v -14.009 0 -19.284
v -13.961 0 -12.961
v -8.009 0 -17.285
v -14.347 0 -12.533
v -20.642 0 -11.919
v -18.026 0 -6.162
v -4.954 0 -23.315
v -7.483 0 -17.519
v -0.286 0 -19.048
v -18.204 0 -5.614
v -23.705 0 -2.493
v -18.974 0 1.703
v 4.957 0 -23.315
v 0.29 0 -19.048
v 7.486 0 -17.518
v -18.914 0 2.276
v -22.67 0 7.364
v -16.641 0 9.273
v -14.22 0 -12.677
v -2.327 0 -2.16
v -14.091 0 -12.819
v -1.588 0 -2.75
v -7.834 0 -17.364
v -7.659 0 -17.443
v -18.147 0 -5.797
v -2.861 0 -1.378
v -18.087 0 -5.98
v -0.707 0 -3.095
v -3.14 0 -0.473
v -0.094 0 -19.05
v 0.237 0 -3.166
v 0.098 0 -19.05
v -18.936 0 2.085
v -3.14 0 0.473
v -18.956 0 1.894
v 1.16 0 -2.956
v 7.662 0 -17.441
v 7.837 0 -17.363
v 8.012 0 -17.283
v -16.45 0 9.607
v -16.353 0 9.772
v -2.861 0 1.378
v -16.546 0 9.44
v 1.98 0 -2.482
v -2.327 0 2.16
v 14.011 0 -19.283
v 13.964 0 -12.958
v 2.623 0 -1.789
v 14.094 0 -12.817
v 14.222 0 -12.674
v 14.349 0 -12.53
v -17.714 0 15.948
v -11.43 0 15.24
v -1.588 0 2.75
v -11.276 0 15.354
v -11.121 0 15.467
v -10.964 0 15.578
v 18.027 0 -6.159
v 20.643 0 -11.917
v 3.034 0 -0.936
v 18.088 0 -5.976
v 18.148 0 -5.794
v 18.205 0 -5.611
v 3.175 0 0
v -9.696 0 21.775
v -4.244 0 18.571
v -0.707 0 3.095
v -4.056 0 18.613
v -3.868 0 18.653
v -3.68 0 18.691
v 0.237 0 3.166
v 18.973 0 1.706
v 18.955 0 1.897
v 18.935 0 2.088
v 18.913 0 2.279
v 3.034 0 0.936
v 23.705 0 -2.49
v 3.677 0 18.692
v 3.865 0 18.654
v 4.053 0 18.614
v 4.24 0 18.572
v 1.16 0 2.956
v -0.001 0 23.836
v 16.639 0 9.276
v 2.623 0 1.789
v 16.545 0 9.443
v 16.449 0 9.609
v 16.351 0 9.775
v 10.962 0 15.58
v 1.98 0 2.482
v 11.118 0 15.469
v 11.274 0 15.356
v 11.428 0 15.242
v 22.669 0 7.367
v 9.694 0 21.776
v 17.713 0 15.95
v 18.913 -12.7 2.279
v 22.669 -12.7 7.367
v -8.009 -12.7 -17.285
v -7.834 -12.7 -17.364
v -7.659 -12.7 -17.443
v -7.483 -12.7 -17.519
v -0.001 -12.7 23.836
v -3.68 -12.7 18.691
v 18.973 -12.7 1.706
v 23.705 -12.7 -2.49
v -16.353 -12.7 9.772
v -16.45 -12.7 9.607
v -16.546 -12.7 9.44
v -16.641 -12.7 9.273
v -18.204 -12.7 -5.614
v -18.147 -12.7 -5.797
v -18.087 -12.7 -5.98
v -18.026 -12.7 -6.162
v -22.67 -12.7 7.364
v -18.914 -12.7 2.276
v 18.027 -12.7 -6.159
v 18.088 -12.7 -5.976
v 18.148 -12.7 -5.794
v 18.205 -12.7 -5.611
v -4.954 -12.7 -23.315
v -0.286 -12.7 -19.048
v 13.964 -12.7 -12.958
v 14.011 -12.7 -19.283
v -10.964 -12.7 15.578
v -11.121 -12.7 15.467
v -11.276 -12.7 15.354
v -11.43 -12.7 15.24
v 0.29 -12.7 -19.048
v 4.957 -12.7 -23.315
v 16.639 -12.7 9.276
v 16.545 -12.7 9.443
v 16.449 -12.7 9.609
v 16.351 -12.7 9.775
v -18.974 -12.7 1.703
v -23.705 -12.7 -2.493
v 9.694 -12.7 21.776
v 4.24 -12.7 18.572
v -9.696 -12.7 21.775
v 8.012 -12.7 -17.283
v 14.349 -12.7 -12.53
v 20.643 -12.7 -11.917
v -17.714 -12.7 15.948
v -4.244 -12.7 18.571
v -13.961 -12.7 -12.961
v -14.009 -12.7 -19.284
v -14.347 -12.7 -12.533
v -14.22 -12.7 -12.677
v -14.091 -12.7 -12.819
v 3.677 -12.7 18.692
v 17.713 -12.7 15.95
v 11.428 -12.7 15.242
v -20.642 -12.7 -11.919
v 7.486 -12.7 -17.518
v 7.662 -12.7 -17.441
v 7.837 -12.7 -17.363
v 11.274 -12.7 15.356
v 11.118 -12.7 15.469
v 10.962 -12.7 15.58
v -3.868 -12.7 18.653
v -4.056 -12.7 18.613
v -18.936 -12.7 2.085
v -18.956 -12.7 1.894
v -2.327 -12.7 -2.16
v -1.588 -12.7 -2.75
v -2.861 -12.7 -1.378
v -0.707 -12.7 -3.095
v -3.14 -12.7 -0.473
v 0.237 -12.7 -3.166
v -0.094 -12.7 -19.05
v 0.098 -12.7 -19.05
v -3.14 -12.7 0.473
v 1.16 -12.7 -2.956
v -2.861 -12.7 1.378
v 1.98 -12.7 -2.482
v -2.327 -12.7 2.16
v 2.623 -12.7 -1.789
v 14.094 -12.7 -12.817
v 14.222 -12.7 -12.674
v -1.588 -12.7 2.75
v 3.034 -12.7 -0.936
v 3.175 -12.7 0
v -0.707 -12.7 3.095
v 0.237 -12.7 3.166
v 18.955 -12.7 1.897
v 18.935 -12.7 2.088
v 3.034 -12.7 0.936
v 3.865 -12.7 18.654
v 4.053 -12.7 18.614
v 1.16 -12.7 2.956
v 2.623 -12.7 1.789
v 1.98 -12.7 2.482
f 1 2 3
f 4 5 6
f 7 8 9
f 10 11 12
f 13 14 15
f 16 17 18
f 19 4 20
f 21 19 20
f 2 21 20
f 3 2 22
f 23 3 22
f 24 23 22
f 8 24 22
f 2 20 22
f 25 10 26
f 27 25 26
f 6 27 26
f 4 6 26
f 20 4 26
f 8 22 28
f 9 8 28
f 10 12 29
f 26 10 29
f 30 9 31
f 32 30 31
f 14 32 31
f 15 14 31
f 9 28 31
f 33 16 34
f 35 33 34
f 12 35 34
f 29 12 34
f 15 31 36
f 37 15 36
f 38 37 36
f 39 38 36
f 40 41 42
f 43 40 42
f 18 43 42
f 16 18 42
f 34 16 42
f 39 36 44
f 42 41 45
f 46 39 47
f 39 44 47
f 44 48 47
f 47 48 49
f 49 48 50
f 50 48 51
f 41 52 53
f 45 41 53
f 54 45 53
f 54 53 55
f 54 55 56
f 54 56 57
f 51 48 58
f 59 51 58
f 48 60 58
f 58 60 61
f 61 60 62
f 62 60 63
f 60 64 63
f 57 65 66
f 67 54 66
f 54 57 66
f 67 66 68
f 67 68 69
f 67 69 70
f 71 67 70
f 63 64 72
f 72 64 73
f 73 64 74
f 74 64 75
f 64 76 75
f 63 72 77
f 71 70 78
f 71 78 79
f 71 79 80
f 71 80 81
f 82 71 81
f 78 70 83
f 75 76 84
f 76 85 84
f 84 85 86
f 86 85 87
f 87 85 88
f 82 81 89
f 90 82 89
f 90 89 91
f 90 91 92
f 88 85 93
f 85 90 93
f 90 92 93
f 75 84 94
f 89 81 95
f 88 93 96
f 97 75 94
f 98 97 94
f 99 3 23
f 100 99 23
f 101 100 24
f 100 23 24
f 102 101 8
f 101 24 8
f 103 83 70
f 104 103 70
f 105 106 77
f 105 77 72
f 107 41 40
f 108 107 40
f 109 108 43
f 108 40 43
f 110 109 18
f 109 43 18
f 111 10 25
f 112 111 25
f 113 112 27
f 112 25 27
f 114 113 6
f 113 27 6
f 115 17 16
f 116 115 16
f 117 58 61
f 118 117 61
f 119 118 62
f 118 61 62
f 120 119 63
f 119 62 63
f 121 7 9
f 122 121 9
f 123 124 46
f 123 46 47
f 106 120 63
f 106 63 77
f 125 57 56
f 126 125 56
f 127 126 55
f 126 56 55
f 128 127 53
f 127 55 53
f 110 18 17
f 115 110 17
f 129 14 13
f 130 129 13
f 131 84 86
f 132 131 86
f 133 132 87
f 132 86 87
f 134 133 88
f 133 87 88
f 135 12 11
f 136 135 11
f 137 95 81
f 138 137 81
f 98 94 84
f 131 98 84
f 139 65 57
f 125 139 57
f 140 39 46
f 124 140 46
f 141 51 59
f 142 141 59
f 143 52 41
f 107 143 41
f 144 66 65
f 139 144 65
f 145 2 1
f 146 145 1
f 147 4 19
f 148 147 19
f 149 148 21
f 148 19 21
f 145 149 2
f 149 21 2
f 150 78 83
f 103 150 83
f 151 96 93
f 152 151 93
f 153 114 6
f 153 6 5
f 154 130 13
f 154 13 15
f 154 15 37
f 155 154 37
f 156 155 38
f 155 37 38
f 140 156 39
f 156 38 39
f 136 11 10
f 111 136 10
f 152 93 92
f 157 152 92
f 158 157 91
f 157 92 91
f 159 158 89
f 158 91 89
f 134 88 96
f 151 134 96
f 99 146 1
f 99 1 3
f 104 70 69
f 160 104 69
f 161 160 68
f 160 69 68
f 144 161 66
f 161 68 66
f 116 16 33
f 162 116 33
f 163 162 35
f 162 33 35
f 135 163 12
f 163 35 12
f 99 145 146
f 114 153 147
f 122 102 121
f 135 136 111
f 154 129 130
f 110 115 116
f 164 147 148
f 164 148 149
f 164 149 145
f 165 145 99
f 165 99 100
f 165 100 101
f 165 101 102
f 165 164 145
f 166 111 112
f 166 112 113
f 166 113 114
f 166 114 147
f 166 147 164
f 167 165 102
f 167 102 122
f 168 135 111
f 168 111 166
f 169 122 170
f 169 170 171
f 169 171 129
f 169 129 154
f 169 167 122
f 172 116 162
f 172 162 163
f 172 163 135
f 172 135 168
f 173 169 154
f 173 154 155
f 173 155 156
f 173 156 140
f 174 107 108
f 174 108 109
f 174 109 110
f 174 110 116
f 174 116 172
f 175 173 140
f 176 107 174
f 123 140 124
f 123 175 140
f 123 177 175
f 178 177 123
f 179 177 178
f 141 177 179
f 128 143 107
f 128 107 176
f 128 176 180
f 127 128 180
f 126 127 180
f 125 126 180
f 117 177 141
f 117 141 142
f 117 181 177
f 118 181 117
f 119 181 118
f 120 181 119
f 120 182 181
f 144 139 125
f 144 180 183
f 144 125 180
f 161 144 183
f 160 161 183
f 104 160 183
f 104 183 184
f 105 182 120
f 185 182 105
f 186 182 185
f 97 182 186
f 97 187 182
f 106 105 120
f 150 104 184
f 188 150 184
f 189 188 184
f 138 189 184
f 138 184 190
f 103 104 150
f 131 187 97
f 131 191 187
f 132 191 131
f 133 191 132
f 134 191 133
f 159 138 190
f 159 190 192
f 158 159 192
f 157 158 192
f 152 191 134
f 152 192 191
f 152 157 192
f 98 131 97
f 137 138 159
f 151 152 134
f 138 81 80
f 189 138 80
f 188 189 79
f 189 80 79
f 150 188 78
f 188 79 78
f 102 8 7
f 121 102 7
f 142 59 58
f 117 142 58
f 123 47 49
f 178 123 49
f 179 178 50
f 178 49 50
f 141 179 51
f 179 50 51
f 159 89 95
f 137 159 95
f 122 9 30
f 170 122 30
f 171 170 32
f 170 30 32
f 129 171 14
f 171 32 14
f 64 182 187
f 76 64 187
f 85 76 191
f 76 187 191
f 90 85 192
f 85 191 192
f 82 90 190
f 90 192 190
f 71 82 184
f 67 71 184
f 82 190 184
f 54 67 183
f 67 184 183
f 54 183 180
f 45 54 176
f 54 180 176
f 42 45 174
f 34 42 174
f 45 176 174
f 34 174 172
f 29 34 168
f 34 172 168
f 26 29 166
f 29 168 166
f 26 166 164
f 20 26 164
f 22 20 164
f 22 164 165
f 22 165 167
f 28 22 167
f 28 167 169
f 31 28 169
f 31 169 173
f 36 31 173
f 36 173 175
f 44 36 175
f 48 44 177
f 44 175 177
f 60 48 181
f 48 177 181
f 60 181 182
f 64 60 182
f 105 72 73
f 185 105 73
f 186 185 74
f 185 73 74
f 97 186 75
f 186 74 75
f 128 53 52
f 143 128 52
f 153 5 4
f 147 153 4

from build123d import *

# Parameters (mm, degrees)
F1_DEPTH = 12.7
F2_R     = 3.175
F3_DEPTH = 12.7


with BuildPart() as f1:
    # F0 (on Front) → F1 (new body)
    with BuildSketch(Plane.XZ):
        with BuildLine():
            ThreePointArc((-3.680107, 18.691156), (-0.001675, 19.05), (3.676821, 18.691803))
            Line((3.676821, 18.691803), (-0.001412, 23.835839))
            Line((-0.001412, 23.835839), (-3.680107, 18.691156))
        make_face()
        with BuildLine():
            ThreePointArc((-10.964323, 15.578386), (-7.749863, 17.40236), (-4.243698, 18.571309))
            Line((-4.243698, 18.571309), (-9.696199, 21.774548))
            Line((-9.696199, 21.774548), (-10.964323, 15.578386))
        make_face()
        with BuildLine():
            ThreePointArc((-16.352708, 9.771972), (-14.158029, 12.745694), (-11.430443, 15.239668))
            Line((-11.430443, 15.239668), (-17.714425, 15.94824))
            Line((-17.714425, 15.94824), (-16.352708, 9.771972))
        make_face()
        with BuildLine():
            ThreePointArc((-18.913561, 2.275895), (-18.118144, 5.885181), (-16.64076, 9.272949))
            Line((-16.64076, 9.272949), (-22.669666, 7.364337))
            Line((-22.669666, 7.364337), (-18.913561, 2.275895))
        make_face()
        with BuildLine():
            ThreePointArc((4.240433, 18.572055), (7.746803, 17.403722), (10.961584, 15.580313))
            Line((10.961584, 15.580313), (9.693619, 21.775697))
            Line((9.693619, 21.775697), (4.240433, 18.572055))
        make_face()
        with BuildLine():
            ThreePointArc((11.427763, 15.241677), (14.155788, 12.748182), (16.35099, 9.774847))
            Line((16.35099, 9.774847), (17.712536, 15.950339))
            Line((17.712536, 15.950339), (11.427763, 15.241677))
        make_face()
        with BuildLine():
            ThreePointArc((16.63913, 9.275875), (18.117109, 5.888366), (18.913161, 2.27922))
            Line((18.913161, 2.27922), (22.668794, 7.367022))
            Line((22.668794, 7.367022), (16.63913, 9.275875))
        make_face()
        with BuildLine():
            ThreePointArc((18.97344, 1.70619), (19.03085, 0.853953), (19.05, 0))
            ThreePointArc((19.05, 0), (18.837584, -2.836885), (18.205075, -5.610505))
            Line((18.205075, -5.610505), (23.705411, -2.490119))
            Line((23.705411, -2.490119), (18.97344, 1.70619))
        make_face()
        with BuildLine():
            Line((20.643148, -11.916697), (18.02707, -6.158511))
            ThreePointArc((18.02707, -6.158511), (16.498621, -9.52355), (14.349165, -12.530122))
            Line((14.349165, -12.530122), (20.643148, -11.916697))
        make_face()
        with BuildLine():
            Line((14.011497, -19.282769), (13.963655, -12.95835))
            ThreePointArc((13.963655, -12.95835), (11.198664, -15.410789), (8.012155, -17.283167))
            Line((8.012155, -17.283167), (14.011497, -19.282769))
        make_face()
        with BuildLine():
            ThreePointArc((18.205075, -5.610505), (18.837584, -2.836885), (19.05, 0))
            ThreePointArc((19.05, 0), (19.03085, 0.853953), (18.97344, 1.70619))
            ThreePointArc((18.97344, 1.70619), (18.945467, 1.992933), (18.913161, 2.27922))
            ThreePointArc((18.913161, 2.27922), (18.117109, 5.888366), (16.63913, 9.275875))
            ThreePointArc((16.63913, 9.275875), (16.496947, 9.52645), (16.35099, 9.774847))
            ThreePointArc((16.35099, 9.774847), (14.155788, 12.748182), (11.427763, 15.241677))
            ThreePointArc((11.427763, 15.241677), (11.195954, 15.412758), (10.961584, 15.580313))
            ThreePointArc((10.961584, 15.580313), (7.746803, 17.403722), (4.240433, 18.572055))
            ThreePointArc((4.240433, 18.572055), (3.95908, 18.63406), (3.676821, 18.691803))
            ThreePointArc((3.676821, 18.691803), (-0.001675, 19.05), (-3.680107, 18.691156))
            ThreePointArc((-3.680107, 18.691156), (-3.962356, 18.633364), (-4.243698, 18.571309))
            ThreePointArc((-4.243698, 18.571309), (-7.749863, 17.40236), (-10.964323, 15.578386))
            ThreePointArc((-10.964323, 15.578386), (-11.198664, 15.410789), (-11.430443, 15.239668))
            ThreePointArc((-11.430443, 15.239668), (-14.158029, 12.745694), (-16.352708, 9.771972))
            ThreePointArc((-16.352708, 9.771972), (-16.498621, 9.52355), (-16.64076, 9.272949))
            ThreePointArc((-16.64076, 9.272949), (-18.118144, 5.885181), (-18.913561, 2.275895))
            ThreePointArc((-18.913561, 2.275895), (-18.945817, 1.989602), (-18.973739, 1.702854))
            ThreePointArc((-18.973739, 1.702854), (-18.945467, -1.992933), (-18.204088, -5.613705))
            ThreePointArc((-18.204088, -5.613705), (-18.117109, -5.888366), (-18.025987, -6.161681))
            ThreePointArc((-18.025987, -6.161681), (-16.496947, -9.52645), (-14.346962, -12.532644))
            ThreePointArc((-14.346962, -12.532644), (-14.155788, -12.748182), (-13.961377, -12.960805))
            ThreePointArc((-13.961377, -12.960805), (-11.195954, -15.412758), (-8.009116, -17.284576))
            ThreePointArc((-8.009116, -17.284576), (-7.746803, -17.403722), (-7.482718, -17.518888))
            ThreePointArc((-7.482718, -17.518888), (-3.95908, -18.63406), (-0.286422, -19.047847))
            ThreePointArc((-0.286422, -19.047847), (0.001675, -19.05), (0.28977, -19.047796))
            ThreePointArc((0.28977, -19.047796), (3.962356, -18.633364), (7.485798, -17.517572))
            ThreePointArc((7.485798, -17.517572), (7.749863, -17.40236), (8.012155, -17.283167))
            ThreePointArc((8.012155, -17.283167), (11.198664, -15.410789), (13.963655, -12.95835))
            ThreePointArc((13.963655, -12.95835), (14.158029, -12.745694), (14.349165, -12.530122))
            ThreePointArc((14.349165, -12.530122), (16.498621, -9.52355), (18.02707, -6.158511))
            ThreePointArc((18.02707, -6.158511), (18.118144, -5.885181), (18.205075, -5.610505))
        make_face()
        with BuildLine():
            Line((4.957131, -23.314675), (7.485798, -17.517572))
            ThreePointArc((7.485798, -17.517572), (3.962356, -18.633364), (0.28977, -19.047796))
            Line((0.28977, -19.047796), (4.957131, -23.314675))
        make_face()
        with BuildLine():
            Line((-4.954369, -23.315262), (-0.286422, -19.047847))
            ThreePointArc((-0.286422, -19.047847), (-3.95908, -18.63406), (-7.482718, -17.518888))
            Line((-7.482718, -17.518888), (-4.954369, -23.315262))
        make_face()
        with BuildLine():
            Line((-14.009212, -19.284429), (-8.009116, -17.284576))
            ThreePointArc((-8.009116, -17.284576), (-11.195954, -15.412758), (-13.961377, -12.960805))
            Line((-13.961377, -12.960805), (-14.009212, -19.284429))
        make_face()
        with BuildLine():
            Line((-20.641736, -11.919142), (-14.346962, -12.532644))
            ThreePointArc((-14.346962, -12.532644), (-16.496947, -9.52645), (-18.025987, -6.161681))
            Line((-18.025987, -6.161681), (-20.641736, -11.919142))
        make_face()
        with BuildLine():
            Line((-23.705116, -2.492928), (-18.204088, -5.613705))
            ThreePointArc((-18.204088, -5.613705), (-18.945467, -1.992933), (-18.973739, 1.702854))
            Line((-18.973739, 1.702854), (-23.705116, -2.492928))
        make_face()
    extrude(amount=F1_DEPTH)

    # F2 (on face) → F3 (cut)
    with BuildSketch(Plane.XZ.offset(12.7)):
        Circle(F2_R)
    extrude(amount=-F3_DEPTH, mode=Mode.SUBTRACT)


solid = f1.part
